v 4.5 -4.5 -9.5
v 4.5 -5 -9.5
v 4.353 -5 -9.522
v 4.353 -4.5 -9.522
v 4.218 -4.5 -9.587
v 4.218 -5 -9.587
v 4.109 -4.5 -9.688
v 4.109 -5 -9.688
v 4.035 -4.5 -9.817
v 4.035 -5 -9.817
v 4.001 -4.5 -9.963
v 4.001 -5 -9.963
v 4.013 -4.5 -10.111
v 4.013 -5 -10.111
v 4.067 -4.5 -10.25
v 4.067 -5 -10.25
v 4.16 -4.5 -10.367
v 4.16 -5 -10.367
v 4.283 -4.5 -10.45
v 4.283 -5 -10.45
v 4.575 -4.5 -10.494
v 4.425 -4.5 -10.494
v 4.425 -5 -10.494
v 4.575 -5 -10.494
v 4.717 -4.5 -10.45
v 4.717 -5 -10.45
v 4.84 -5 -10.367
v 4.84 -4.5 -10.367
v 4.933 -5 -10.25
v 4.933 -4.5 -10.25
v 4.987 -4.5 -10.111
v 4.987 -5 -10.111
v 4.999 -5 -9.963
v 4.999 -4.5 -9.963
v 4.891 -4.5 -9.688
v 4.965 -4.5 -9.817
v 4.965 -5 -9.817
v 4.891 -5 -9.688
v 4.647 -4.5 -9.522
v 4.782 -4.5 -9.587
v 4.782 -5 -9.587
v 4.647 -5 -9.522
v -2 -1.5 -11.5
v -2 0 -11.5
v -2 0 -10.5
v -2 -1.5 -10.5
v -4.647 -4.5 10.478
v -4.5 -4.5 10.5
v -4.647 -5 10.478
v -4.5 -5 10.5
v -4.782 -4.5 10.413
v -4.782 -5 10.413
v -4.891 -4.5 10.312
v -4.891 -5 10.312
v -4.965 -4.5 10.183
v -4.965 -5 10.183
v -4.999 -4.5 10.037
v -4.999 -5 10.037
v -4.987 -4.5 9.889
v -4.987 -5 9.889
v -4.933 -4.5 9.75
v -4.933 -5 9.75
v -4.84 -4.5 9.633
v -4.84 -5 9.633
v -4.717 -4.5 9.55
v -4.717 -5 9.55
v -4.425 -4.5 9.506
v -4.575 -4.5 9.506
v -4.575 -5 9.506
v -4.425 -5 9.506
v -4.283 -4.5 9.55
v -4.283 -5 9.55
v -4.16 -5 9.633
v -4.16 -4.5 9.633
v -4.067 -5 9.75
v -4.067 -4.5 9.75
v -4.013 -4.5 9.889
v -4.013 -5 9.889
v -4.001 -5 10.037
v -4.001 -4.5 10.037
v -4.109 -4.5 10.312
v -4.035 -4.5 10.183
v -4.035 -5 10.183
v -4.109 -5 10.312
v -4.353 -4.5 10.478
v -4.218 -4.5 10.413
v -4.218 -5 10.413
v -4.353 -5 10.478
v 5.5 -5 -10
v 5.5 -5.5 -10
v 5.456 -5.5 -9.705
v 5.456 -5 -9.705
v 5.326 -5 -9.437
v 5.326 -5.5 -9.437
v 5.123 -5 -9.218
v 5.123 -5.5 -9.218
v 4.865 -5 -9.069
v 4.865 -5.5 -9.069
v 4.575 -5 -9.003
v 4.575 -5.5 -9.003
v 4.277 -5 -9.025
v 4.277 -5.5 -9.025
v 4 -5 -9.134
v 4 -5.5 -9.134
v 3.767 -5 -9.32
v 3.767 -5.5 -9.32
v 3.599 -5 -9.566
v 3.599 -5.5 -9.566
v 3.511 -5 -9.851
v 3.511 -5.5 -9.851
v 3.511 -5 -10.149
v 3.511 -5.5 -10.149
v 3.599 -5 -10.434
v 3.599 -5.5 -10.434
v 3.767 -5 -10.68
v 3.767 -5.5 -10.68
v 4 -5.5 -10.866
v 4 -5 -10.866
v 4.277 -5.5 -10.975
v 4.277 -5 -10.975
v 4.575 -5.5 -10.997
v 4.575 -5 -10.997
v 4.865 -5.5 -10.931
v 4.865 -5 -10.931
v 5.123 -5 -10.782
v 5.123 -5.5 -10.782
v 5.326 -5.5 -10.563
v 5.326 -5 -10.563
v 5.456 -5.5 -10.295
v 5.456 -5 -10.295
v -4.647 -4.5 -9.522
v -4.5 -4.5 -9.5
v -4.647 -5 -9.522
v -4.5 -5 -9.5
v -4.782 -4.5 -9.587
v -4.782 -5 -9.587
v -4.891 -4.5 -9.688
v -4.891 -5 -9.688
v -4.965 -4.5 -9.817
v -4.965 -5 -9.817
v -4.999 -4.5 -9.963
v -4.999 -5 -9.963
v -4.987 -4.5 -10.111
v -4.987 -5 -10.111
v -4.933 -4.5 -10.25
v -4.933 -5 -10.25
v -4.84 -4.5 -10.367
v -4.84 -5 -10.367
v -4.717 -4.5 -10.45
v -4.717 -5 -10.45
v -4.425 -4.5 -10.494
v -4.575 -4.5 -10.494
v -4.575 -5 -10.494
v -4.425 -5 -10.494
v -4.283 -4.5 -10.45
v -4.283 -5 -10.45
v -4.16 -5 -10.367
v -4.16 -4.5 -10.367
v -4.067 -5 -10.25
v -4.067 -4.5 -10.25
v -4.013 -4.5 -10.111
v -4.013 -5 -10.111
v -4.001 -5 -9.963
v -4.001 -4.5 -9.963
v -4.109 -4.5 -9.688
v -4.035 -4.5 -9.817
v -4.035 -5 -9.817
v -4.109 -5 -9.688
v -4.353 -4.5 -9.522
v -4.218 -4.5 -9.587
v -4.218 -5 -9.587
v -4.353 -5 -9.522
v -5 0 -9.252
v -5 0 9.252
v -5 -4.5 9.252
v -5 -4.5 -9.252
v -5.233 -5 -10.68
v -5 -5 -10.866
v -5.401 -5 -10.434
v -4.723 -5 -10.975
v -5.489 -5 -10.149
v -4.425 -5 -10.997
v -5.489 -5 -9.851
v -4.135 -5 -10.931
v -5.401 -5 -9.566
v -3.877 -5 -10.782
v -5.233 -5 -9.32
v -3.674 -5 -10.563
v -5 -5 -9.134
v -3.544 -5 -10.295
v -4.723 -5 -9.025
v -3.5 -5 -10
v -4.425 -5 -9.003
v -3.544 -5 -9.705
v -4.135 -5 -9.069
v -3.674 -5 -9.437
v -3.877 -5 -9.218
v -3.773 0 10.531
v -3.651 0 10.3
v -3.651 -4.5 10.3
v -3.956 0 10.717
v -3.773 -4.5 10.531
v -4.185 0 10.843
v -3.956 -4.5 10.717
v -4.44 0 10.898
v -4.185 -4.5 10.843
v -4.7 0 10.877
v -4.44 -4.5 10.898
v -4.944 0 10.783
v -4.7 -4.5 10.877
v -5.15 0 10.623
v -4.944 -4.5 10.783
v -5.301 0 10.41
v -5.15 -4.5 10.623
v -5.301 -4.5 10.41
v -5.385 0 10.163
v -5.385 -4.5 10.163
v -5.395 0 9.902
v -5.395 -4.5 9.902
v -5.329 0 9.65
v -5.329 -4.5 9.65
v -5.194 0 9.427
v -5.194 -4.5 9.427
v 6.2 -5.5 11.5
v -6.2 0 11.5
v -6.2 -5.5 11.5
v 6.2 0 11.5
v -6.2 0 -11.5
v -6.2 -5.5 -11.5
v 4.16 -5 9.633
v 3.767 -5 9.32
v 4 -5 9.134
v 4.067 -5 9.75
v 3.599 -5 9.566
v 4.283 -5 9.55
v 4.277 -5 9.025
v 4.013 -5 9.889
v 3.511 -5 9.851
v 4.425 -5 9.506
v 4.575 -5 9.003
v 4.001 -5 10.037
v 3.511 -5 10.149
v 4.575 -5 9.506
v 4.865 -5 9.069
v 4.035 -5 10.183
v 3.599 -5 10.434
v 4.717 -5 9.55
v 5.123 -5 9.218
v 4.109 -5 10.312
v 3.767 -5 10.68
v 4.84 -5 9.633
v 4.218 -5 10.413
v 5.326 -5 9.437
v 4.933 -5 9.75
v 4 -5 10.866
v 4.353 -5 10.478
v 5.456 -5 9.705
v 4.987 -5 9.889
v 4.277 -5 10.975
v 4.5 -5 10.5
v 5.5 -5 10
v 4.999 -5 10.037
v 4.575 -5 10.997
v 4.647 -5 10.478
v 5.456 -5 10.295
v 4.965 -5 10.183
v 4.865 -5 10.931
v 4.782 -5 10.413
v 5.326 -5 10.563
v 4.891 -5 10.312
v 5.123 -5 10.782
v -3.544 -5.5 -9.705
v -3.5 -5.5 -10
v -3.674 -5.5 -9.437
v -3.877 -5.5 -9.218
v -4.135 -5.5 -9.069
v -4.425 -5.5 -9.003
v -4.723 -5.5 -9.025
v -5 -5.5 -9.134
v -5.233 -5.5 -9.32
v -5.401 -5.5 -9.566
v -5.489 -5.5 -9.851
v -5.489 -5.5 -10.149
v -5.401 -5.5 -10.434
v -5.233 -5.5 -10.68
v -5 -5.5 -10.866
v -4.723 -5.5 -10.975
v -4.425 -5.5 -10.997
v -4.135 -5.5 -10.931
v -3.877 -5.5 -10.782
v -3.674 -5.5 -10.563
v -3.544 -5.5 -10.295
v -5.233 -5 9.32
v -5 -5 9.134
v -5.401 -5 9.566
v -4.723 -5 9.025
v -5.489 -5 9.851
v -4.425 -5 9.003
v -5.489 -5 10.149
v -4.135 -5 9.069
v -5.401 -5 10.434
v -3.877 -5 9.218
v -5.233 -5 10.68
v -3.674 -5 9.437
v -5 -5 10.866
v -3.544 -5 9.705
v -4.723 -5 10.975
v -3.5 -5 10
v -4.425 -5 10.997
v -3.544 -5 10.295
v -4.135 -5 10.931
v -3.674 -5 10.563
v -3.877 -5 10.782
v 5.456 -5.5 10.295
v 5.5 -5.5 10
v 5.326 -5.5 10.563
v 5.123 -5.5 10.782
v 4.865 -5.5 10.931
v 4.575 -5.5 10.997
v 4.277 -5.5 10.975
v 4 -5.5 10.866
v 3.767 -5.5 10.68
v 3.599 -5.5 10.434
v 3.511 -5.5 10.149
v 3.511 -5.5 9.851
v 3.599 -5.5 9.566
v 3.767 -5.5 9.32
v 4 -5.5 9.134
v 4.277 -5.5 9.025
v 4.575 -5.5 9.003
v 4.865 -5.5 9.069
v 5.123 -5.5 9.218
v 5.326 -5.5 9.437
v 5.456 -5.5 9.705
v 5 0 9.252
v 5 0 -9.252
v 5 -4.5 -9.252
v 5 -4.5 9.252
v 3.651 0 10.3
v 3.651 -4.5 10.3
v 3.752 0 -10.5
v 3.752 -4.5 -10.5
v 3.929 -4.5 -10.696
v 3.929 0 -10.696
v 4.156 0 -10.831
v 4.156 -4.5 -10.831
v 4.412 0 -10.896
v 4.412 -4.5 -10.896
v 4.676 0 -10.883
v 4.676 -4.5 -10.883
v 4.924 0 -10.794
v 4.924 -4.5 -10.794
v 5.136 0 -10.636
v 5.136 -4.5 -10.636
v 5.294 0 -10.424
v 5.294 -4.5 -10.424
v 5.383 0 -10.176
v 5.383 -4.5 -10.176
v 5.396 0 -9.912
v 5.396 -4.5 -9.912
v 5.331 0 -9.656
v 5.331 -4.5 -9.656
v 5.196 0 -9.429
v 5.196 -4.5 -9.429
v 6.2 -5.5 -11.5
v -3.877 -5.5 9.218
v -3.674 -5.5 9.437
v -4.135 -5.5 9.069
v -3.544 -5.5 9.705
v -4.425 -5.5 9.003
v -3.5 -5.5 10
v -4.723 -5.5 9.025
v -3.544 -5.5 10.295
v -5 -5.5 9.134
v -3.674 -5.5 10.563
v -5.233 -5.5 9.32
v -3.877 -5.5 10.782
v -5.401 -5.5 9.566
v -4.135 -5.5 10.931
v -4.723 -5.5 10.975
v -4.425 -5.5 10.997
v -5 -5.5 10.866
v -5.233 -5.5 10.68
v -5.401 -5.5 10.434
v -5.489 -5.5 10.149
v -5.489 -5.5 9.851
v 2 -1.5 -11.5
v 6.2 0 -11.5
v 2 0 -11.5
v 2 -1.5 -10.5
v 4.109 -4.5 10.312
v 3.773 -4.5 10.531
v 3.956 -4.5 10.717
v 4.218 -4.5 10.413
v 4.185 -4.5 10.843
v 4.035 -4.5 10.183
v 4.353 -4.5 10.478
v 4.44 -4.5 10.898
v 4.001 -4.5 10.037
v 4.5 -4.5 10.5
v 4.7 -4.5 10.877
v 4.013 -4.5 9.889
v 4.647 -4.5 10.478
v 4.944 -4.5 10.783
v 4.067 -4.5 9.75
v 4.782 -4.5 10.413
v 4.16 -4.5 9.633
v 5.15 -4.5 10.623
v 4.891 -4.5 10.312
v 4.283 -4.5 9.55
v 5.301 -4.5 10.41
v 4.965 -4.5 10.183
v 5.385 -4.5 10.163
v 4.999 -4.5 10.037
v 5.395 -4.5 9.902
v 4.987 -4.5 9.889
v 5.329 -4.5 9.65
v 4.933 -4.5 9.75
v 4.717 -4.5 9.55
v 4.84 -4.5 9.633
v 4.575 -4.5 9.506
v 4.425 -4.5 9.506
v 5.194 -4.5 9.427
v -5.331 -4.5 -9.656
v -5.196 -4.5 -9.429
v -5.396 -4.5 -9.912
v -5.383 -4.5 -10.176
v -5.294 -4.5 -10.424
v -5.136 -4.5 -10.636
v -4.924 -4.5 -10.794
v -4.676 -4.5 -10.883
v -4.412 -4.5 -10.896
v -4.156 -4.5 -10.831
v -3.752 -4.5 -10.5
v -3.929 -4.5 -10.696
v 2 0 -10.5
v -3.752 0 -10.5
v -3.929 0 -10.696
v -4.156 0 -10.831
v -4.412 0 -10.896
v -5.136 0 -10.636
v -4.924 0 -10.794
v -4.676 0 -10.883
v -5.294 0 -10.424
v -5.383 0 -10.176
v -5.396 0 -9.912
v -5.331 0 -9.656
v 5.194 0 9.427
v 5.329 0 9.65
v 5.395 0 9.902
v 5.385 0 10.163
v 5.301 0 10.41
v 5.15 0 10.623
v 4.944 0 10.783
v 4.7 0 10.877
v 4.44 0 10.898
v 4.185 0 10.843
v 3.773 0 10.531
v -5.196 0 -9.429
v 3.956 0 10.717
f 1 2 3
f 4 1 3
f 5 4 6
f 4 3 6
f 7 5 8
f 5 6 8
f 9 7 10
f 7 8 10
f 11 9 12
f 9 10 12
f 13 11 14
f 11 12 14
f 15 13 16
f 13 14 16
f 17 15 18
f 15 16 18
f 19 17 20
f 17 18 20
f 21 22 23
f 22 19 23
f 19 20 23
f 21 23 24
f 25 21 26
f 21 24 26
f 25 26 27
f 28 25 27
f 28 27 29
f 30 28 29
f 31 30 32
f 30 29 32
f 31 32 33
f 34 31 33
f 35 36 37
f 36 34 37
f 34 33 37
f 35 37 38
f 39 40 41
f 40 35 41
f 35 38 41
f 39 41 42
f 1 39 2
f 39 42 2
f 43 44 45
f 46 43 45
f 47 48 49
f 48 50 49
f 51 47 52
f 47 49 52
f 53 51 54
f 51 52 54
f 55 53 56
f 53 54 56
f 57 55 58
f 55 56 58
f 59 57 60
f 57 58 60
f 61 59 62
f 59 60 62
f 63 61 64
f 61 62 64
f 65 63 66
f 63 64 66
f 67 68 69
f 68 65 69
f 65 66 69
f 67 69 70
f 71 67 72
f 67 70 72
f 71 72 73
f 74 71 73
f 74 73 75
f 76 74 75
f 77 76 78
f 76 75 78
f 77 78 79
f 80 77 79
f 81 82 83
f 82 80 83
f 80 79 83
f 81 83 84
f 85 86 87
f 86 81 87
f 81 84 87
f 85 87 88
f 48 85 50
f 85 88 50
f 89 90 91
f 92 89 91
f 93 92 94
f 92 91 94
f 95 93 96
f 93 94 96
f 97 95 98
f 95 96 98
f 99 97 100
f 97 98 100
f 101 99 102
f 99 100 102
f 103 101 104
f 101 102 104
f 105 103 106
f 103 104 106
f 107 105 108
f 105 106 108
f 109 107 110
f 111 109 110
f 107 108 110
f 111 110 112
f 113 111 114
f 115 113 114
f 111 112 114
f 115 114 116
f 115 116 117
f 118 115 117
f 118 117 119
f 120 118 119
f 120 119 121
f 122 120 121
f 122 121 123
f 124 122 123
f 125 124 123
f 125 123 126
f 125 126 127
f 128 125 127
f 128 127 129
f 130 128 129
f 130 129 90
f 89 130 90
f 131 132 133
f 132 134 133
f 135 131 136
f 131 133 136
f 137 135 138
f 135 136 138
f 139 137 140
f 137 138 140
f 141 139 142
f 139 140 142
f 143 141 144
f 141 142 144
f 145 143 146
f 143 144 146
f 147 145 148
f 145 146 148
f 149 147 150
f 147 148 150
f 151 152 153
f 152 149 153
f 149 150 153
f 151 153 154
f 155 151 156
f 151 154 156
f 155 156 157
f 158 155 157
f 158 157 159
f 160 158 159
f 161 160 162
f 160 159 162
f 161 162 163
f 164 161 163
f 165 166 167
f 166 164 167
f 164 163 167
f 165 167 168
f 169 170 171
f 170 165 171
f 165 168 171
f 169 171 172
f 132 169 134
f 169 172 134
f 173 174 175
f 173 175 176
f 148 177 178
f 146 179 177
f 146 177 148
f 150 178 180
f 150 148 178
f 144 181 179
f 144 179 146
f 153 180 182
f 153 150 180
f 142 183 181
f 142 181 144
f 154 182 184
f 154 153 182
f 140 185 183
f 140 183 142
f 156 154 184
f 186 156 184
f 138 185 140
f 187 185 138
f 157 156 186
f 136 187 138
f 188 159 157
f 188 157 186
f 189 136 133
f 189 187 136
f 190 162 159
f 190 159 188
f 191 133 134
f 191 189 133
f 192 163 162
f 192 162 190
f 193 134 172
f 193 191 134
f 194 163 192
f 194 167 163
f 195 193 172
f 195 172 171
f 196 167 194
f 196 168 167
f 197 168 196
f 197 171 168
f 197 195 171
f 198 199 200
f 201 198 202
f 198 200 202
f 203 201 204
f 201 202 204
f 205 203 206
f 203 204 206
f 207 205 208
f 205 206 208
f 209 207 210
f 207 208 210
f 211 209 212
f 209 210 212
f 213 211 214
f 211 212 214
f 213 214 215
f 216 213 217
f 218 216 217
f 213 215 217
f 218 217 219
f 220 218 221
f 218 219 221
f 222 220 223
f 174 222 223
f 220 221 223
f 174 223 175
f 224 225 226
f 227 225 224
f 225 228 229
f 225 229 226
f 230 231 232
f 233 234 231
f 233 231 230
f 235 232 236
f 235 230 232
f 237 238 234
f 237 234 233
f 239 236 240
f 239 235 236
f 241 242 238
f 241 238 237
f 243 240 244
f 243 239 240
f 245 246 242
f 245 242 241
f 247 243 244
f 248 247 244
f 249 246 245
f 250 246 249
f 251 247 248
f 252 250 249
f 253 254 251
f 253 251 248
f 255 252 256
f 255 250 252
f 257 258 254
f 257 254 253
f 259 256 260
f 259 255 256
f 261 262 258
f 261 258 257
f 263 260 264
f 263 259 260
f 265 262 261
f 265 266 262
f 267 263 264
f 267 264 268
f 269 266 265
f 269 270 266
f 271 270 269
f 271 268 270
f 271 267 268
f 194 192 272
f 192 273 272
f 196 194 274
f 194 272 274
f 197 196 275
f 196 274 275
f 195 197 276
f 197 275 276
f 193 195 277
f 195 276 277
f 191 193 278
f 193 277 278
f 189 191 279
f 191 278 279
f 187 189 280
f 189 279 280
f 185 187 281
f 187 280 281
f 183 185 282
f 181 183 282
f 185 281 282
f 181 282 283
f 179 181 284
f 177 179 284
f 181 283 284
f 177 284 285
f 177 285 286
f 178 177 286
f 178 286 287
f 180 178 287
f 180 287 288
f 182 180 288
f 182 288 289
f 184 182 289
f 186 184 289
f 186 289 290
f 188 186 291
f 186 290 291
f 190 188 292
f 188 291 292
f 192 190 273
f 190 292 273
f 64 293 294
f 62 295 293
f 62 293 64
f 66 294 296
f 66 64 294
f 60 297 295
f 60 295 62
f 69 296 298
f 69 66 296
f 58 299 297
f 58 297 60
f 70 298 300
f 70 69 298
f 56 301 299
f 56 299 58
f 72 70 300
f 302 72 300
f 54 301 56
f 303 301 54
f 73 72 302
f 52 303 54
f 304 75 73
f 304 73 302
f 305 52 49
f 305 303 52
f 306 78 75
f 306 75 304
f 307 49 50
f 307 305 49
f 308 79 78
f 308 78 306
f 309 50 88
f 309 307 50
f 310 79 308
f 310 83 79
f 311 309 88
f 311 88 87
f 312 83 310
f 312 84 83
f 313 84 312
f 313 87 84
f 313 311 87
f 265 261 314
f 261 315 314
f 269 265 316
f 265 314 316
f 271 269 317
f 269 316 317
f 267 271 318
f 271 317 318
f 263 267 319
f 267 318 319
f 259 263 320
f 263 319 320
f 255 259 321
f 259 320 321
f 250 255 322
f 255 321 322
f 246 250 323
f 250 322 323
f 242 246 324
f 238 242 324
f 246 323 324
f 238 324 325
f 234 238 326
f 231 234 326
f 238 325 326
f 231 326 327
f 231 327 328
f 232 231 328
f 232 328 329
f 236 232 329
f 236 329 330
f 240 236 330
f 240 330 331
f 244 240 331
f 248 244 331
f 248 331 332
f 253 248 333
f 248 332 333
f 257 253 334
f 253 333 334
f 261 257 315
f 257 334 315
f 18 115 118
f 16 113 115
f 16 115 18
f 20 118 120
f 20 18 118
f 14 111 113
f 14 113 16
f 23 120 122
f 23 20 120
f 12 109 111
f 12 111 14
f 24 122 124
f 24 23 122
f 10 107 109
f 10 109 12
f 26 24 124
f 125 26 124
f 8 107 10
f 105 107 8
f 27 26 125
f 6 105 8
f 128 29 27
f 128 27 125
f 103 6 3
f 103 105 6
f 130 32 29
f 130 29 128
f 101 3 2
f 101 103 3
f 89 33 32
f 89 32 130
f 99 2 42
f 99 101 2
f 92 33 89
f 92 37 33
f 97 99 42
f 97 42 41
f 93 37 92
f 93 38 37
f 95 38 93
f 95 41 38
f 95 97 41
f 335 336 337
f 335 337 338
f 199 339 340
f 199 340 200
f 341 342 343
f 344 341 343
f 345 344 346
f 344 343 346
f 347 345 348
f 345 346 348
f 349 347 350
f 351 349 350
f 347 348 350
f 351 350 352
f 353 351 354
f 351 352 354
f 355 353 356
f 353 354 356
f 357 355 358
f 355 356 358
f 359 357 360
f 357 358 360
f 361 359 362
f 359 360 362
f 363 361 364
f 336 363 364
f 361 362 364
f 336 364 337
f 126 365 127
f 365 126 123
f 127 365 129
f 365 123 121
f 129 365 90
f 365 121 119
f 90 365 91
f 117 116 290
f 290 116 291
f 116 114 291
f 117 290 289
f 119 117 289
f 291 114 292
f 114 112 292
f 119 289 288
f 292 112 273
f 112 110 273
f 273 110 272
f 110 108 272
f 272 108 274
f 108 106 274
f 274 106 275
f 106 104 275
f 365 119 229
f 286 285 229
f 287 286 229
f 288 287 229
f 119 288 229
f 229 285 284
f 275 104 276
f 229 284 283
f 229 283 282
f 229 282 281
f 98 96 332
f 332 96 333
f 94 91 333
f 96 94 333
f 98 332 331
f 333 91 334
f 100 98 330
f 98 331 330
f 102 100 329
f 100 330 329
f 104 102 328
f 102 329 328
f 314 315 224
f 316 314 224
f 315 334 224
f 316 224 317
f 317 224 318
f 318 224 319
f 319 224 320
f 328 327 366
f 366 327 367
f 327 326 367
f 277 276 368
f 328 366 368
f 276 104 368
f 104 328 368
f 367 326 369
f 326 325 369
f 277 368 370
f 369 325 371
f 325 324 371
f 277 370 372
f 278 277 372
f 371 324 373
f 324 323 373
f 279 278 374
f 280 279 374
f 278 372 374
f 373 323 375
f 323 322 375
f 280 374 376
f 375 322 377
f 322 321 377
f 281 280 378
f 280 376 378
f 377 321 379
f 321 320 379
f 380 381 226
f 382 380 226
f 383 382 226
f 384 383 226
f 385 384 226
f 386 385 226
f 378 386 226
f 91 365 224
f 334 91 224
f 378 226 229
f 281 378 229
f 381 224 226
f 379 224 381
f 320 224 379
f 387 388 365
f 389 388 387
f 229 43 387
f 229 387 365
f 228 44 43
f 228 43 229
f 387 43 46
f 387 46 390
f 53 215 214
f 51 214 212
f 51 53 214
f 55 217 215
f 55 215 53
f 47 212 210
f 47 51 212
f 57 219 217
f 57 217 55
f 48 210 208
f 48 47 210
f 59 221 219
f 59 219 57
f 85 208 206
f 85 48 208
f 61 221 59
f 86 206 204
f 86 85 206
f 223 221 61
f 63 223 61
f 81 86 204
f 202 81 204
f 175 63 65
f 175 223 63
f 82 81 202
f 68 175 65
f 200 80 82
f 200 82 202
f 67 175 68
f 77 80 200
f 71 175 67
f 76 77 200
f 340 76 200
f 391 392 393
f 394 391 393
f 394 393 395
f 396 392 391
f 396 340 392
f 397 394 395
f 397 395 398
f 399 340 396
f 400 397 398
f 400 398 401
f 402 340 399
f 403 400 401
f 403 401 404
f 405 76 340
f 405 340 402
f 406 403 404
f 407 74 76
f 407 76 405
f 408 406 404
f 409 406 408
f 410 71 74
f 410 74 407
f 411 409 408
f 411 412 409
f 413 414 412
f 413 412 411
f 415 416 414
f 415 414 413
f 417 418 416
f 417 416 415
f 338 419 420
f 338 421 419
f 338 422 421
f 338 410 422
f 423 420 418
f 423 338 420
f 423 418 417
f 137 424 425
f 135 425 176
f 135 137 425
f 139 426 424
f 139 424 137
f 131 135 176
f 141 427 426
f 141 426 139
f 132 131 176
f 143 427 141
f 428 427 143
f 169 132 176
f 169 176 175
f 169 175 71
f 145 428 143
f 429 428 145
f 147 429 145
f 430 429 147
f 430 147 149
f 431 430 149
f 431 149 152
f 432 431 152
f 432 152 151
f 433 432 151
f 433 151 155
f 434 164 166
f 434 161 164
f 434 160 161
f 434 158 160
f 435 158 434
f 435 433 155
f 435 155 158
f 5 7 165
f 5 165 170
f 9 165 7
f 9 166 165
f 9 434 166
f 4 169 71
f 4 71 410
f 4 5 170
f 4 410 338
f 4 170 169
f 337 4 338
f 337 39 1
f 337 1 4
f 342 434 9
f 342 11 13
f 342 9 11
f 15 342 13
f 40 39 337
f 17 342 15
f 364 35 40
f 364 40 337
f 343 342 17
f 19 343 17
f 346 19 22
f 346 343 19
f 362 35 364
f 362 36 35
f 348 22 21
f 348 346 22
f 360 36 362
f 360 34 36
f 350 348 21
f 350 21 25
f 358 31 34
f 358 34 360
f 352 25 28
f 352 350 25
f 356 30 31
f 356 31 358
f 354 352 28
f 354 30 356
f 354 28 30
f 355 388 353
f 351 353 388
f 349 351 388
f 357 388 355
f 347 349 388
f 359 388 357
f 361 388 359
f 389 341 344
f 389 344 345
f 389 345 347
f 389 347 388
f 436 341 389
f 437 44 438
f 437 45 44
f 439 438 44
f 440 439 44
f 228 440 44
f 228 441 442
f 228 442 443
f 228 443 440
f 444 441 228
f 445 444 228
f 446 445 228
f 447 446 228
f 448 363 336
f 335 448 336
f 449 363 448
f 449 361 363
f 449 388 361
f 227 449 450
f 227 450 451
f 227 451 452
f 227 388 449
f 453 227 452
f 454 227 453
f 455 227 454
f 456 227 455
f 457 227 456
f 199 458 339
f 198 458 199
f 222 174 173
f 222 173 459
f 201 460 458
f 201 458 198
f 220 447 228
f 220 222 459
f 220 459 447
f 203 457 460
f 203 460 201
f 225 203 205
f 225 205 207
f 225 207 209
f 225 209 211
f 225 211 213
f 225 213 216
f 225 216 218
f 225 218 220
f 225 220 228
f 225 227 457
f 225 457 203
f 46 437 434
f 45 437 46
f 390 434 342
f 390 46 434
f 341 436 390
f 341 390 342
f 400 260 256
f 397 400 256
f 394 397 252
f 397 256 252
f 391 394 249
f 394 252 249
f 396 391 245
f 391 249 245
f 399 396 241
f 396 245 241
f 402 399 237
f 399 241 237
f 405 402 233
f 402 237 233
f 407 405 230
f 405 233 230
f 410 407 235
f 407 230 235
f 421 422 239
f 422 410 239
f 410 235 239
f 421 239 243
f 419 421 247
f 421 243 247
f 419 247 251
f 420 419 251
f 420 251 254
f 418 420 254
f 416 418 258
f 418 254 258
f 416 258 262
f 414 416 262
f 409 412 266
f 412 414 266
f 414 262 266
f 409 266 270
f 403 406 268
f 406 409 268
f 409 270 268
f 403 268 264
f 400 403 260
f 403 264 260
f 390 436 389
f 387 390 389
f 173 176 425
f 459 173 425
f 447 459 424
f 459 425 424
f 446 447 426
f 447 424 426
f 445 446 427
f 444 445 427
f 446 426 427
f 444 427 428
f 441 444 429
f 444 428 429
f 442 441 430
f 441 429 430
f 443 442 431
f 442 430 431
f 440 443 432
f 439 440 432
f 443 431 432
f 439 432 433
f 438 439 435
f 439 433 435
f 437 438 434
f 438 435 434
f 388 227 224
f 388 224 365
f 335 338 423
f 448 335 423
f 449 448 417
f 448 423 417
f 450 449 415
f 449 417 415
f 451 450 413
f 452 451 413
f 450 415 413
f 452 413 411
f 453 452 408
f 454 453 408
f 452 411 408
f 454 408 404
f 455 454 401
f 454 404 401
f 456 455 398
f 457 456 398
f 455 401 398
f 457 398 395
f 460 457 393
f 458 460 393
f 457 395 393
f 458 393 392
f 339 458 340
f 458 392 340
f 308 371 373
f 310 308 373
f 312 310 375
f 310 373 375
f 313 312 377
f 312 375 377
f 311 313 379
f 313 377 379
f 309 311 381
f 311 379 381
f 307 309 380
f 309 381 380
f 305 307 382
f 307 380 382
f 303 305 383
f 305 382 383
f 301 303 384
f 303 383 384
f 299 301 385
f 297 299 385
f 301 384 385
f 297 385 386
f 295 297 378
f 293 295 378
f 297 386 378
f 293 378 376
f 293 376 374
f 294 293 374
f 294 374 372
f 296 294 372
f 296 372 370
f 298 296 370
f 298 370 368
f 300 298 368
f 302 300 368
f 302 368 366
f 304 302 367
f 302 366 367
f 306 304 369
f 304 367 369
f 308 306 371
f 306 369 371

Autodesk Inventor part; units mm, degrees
ref_plane "YZ Plane" through (0, 0, 0) normal (1, 0, 0) x (0, 1, 0)
ref_plane "XZ Plane" through (0, 0, 0) normal (0, 1, 0) x (-1, 0, 0)
ref_plane "XY Plane" through (0, 0, 0) normal (0, 0, 1) x (1, 0, 0)
sketch "Эскиз1" plane through (0, 0, 0) normal (0, 1, 0) x (-1, 0, 0)
  line L0 (6.2, 11.5) -> (-6.2, 11.5)
  line L1 (-6.2, 11.5) -> (-6.2, -11.5)
  line L2 (-6.2, -11.5) -> (6.2, -11.5)
  line L3 (6.2, -11.5) -> (6.2, 11.5)
  line L4 (6.2, 11.5) -> (-6.2, -11.5) construction
  line L5 (-6.2, 11.5) -> (6.2, -11.5) construction
  point P0 (0, 0)
  dimension "d0" = 12.4
  dimension "d1" = 23
extrude "Выдавливание1" add sketch "Эскиз1" against normal blind 5.5
sketch "Эскиз2" plane through (0, 0, 0) normal (0, 1, 0) x (1, 0, 0)
  line L0 (-6.2, -11.5) -> (6.2, -11.5) projected
  line L1 (6.2, -11.5) -> (6.2, 11.5) projected
  line L2 (6.2, 11.5) -> (-6.2, 11.5) projected
  line L3 (-6.2, 11.5) -> (-6.2, -11.5) projected
  line L4 (-5, 10.5) -> (5, 10.5)
  line L5 (5, 10.5) -> (5, -10.3)
  line L6 (5, -10.3) -> (-5, -10.3)
  line L7 (-5, -10.3) -> (-5, 10.5)
  line L8 (0, 16.1) -> (0, -16.1) projected
  line L9 (-8.68, 0) -> (8.68, 0) projected
  point P0 (0, 0)
  dimension "d4" = 1
  dimension "d5" = 1.2
extrude "Выдавливание2" cut sketch "Эскиз2" against normal blind 4.5 contours L8 L9 L5 L6 | L6 L7 L9 L8 | L7 L4 L8 L9 | L8 L4 L5 L9
sketch "Эскиз3" plane through (0, 0, 0) normal (0, 1, 0) x (1, 0, 0)
  line L0 (-4.5, -10) -> (4.5, -10)
  line L1 (4.5, -10) -> (4.5, 10)
  line L2 (4.5, 10) -> (-4.5, 10)
  line L3 (-4.5, 10) -> (-4.5, -10)
  line L4 (-4.5, -10) -> (4.5, 10) construction
  line L5 (4.5, -10) -> (-4.5, 10) construction
  point P0 (0, 0)
  dimension "d8" = 9
  dimension "d9" = 20
hole "Отверстие1" at (-4.5, 0, -10) at (4.5, 0, -10) at (4.5, 0, 10) at (-4.5, 0, 10) direction (0, -1, 0) diameter 1 depth 8 tip angle 118 counterbore diameter 1.8 counterbore depth 4.5
sketch "Эскиз4" plane through (0, -5.5, 0) normal (0, -1, 0) x (1, 0, 0)
  circle A0 centre (-4.5, 10) radius 0.5 projected
  circle A1 centre (4.5, 10) radius 0.5 projected
  circle A2 centre (4.5, -10) radius 0.5 projected
  circle A3 centre (-4.5, -10) radius 0.5 projected
  circle A4 centre (-4.5, 10) radius 1
  circle A5 centre (4.5, 10) radius 1
  circle A6 centre (4.5, -10) radius 1
  circle A7 centre (-4.5, -10) radius 1
  point P0 (0, 0)
  dimension "d17" = 2
extrude "Выдавливание3" cut sketch "Эскиз4" against normal blind 0.5
sketch "Эскиз5" plane through (0, 0, 0) normal (0, 1, 0) x (1, 0, 0)
  line L0 (-2, 10.5) -> (2, 10.5)
  line L1 (2, 10.5) -> (2, 11.5)
  line L2 (2, 11.5) -> (-2, 11.5)
  line L3 (-2, 11.5) -> (-2, 10.5)
  arc A0 (3.6515, -10.3) -> (5, -9.2517) centre (4.5, -10) ccw projected
  line L4 (3.6515, -10.3) -> (-3.6515, -10.3) projected
  arc A1 (-5, -9.2517) -> (-3.6515, -10.3) centre (-4.5, -10) ccw projected
  line L5 (-5, -9.2517) -> (-5, 9.2517) projected
  arc A2 (-3.7517, 10.5) -> (-5, 9.2517) centre (-4.5, 10) ccw projected
  line L6 (-3.7517, 10.5) -> (3.7517, 10.5) projected
  arc A3 (5, 9.2517) -> (3.7517, 10.5) centre (4.5, 10) ccw projected
  line L7 (5, 9.2517) -> (5, -9.2517) projected
  line L8 (-6.2, -11.5) -> (6.2, -11.5) projected
  line L9 (6.2, -11.5) -> (6.2, 11.5) projected
  line L10 (6.2, 11.5) -> (-6.2, 11.5) projected
  line L11 (-6.2, 11.5) -> (-6.2, -11.5) projected
  line L12 (0, 16.1) -> (0, -16.1) projected
  point P0 (0, 0)
  point P1 (0, 11.5)
  point P2 (0, 10.5)
  dimension "d23" = 4
extrude "Выдавливание4" cut sketch "Эскиз5" against normal blind 1.5 contours L3 L2 L12 L0 | L12 L2 L1 L0
properties part number "Крышка корпуса задняя" material "Пластик ПК/АБС"
